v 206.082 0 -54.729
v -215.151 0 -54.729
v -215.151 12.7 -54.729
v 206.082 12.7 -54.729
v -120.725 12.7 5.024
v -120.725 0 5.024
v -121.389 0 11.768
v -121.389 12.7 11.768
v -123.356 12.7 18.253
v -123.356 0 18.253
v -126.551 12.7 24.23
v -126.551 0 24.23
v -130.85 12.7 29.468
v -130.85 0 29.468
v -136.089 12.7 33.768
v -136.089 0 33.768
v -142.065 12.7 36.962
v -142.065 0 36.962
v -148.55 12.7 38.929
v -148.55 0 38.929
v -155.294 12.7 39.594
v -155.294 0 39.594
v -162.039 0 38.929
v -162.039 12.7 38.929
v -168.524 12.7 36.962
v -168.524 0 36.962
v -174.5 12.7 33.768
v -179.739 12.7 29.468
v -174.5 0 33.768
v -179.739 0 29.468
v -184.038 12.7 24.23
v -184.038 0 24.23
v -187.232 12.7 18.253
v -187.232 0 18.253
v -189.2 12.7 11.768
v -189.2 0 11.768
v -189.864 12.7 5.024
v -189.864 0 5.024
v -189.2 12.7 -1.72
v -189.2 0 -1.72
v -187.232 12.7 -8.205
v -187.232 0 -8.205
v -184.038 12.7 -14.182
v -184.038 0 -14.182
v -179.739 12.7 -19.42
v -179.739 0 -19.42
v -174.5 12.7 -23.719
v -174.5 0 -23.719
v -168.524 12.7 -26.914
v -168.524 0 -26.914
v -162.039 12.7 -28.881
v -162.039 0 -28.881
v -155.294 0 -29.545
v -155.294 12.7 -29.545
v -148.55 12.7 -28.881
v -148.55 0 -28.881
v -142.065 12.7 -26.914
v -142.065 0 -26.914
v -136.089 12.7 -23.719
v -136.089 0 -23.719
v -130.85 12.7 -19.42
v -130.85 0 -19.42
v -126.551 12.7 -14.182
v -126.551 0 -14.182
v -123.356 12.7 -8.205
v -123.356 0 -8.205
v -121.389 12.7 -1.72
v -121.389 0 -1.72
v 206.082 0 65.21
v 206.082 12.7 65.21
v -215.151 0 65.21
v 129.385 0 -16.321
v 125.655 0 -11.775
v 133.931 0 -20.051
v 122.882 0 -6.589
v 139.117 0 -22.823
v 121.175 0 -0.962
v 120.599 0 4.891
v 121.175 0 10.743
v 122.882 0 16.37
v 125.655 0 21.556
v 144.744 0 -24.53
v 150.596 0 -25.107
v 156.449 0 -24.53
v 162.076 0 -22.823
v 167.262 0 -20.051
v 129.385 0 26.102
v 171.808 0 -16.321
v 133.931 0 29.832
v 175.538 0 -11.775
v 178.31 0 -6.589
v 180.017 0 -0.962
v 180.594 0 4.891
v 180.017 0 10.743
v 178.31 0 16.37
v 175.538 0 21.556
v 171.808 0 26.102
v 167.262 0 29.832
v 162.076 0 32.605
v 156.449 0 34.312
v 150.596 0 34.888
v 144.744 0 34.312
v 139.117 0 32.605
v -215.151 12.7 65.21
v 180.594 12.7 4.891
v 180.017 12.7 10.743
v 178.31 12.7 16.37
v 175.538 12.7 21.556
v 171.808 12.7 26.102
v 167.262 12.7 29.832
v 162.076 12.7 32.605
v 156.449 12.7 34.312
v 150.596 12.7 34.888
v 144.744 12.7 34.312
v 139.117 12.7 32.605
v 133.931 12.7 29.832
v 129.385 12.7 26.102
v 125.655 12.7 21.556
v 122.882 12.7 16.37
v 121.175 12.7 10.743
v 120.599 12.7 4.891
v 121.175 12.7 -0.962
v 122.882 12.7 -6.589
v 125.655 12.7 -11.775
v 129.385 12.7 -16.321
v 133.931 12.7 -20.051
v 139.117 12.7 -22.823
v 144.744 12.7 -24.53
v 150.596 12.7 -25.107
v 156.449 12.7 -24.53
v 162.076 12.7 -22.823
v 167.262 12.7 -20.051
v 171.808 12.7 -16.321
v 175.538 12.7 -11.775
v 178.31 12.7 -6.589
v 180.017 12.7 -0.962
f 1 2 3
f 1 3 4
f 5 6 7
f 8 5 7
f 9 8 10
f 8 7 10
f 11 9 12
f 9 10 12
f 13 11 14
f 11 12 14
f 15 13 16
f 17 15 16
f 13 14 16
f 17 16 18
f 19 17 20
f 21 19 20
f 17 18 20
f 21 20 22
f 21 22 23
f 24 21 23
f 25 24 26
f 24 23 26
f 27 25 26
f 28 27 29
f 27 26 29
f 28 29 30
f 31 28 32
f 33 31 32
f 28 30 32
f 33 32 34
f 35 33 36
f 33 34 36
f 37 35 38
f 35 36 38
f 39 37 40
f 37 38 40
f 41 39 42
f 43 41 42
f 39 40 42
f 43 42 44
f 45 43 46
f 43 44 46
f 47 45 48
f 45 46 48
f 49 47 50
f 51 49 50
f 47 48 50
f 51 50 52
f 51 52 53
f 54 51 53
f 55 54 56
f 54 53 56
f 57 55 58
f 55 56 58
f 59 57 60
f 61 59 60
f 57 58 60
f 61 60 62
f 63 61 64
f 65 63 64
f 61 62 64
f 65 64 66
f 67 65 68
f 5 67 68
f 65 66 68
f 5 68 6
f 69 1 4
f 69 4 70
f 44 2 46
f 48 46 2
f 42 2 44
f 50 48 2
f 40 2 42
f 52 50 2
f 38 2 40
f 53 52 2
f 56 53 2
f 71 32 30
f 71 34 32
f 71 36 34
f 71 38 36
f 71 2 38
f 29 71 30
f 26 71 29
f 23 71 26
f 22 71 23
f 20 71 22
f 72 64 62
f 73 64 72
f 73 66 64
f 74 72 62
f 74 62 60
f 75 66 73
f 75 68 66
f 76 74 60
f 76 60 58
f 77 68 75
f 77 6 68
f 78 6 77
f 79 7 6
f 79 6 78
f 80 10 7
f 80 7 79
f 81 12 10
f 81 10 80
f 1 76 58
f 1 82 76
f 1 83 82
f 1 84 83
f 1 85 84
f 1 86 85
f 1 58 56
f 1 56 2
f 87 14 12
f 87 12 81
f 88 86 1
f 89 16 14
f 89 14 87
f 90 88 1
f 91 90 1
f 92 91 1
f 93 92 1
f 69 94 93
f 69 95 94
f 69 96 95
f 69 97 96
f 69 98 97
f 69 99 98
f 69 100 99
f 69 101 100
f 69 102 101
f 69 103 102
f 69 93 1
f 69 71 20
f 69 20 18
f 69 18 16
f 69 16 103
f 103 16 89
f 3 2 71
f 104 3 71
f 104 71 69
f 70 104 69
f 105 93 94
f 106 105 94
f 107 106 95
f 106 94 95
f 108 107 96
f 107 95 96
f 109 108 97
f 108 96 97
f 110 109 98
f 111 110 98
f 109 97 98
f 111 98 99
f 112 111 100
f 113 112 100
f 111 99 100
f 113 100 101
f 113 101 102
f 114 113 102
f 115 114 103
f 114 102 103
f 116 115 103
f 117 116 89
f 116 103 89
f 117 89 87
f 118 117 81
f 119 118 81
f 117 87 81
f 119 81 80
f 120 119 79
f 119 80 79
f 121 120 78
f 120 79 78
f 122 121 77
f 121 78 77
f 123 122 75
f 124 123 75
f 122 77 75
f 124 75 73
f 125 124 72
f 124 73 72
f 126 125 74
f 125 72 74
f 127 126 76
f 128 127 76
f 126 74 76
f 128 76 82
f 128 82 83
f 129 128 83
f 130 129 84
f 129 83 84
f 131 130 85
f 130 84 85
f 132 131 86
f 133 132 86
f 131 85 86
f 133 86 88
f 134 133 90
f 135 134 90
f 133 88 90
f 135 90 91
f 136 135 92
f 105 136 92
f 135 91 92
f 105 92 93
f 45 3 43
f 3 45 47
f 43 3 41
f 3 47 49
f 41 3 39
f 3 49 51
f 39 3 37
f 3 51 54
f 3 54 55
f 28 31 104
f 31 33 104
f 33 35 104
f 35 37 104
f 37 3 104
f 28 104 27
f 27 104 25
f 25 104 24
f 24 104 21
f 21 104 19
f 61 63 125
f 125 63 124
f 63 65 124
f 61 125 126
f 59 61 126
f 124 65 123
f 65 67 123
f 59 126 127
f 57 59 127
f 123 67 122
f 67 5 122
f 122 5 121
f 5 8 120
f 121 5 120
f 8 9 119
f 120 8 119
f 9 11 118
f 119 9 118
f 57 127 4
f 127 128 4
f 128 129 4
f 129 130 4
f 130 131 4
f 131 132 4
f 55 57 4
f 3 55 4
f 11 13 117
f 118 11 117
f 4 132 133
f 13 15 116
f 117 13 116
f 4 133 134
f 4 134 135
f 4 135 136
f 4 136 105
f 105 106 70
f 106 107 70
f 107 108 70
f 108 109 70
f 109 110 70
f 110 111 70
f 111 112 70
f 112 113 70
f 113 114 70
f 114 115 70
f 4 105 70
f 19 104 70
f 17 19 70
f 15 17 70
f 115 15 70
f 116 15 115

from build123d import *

# Parameters (mm, degrees)
F0_W     = 421.2336
F0_H     = 119.9388
F0_R     = 34.5694
F0_R_2   = 29.9974
F1_DEPTH = 12.7


with BuildPart() as f1:
    # F0 (on Front) → F1 (new body)
    with BuildSketch(Plane.XZ):
        with Locations((-4.53439, 5.240247)):
            Rectangle(F0_W, F0_H)
        with Locations((-155.294428, 5.024211)):
            Circle(F0_R, mode=Mode.SUBTRACT)
        with Locations((150.596465, 4.890526)):
            Circle(F0_R_2, mode=Mode.SUBTRACT)
    extrude(amount=-F1_DEPTH)


solid = f1.part
